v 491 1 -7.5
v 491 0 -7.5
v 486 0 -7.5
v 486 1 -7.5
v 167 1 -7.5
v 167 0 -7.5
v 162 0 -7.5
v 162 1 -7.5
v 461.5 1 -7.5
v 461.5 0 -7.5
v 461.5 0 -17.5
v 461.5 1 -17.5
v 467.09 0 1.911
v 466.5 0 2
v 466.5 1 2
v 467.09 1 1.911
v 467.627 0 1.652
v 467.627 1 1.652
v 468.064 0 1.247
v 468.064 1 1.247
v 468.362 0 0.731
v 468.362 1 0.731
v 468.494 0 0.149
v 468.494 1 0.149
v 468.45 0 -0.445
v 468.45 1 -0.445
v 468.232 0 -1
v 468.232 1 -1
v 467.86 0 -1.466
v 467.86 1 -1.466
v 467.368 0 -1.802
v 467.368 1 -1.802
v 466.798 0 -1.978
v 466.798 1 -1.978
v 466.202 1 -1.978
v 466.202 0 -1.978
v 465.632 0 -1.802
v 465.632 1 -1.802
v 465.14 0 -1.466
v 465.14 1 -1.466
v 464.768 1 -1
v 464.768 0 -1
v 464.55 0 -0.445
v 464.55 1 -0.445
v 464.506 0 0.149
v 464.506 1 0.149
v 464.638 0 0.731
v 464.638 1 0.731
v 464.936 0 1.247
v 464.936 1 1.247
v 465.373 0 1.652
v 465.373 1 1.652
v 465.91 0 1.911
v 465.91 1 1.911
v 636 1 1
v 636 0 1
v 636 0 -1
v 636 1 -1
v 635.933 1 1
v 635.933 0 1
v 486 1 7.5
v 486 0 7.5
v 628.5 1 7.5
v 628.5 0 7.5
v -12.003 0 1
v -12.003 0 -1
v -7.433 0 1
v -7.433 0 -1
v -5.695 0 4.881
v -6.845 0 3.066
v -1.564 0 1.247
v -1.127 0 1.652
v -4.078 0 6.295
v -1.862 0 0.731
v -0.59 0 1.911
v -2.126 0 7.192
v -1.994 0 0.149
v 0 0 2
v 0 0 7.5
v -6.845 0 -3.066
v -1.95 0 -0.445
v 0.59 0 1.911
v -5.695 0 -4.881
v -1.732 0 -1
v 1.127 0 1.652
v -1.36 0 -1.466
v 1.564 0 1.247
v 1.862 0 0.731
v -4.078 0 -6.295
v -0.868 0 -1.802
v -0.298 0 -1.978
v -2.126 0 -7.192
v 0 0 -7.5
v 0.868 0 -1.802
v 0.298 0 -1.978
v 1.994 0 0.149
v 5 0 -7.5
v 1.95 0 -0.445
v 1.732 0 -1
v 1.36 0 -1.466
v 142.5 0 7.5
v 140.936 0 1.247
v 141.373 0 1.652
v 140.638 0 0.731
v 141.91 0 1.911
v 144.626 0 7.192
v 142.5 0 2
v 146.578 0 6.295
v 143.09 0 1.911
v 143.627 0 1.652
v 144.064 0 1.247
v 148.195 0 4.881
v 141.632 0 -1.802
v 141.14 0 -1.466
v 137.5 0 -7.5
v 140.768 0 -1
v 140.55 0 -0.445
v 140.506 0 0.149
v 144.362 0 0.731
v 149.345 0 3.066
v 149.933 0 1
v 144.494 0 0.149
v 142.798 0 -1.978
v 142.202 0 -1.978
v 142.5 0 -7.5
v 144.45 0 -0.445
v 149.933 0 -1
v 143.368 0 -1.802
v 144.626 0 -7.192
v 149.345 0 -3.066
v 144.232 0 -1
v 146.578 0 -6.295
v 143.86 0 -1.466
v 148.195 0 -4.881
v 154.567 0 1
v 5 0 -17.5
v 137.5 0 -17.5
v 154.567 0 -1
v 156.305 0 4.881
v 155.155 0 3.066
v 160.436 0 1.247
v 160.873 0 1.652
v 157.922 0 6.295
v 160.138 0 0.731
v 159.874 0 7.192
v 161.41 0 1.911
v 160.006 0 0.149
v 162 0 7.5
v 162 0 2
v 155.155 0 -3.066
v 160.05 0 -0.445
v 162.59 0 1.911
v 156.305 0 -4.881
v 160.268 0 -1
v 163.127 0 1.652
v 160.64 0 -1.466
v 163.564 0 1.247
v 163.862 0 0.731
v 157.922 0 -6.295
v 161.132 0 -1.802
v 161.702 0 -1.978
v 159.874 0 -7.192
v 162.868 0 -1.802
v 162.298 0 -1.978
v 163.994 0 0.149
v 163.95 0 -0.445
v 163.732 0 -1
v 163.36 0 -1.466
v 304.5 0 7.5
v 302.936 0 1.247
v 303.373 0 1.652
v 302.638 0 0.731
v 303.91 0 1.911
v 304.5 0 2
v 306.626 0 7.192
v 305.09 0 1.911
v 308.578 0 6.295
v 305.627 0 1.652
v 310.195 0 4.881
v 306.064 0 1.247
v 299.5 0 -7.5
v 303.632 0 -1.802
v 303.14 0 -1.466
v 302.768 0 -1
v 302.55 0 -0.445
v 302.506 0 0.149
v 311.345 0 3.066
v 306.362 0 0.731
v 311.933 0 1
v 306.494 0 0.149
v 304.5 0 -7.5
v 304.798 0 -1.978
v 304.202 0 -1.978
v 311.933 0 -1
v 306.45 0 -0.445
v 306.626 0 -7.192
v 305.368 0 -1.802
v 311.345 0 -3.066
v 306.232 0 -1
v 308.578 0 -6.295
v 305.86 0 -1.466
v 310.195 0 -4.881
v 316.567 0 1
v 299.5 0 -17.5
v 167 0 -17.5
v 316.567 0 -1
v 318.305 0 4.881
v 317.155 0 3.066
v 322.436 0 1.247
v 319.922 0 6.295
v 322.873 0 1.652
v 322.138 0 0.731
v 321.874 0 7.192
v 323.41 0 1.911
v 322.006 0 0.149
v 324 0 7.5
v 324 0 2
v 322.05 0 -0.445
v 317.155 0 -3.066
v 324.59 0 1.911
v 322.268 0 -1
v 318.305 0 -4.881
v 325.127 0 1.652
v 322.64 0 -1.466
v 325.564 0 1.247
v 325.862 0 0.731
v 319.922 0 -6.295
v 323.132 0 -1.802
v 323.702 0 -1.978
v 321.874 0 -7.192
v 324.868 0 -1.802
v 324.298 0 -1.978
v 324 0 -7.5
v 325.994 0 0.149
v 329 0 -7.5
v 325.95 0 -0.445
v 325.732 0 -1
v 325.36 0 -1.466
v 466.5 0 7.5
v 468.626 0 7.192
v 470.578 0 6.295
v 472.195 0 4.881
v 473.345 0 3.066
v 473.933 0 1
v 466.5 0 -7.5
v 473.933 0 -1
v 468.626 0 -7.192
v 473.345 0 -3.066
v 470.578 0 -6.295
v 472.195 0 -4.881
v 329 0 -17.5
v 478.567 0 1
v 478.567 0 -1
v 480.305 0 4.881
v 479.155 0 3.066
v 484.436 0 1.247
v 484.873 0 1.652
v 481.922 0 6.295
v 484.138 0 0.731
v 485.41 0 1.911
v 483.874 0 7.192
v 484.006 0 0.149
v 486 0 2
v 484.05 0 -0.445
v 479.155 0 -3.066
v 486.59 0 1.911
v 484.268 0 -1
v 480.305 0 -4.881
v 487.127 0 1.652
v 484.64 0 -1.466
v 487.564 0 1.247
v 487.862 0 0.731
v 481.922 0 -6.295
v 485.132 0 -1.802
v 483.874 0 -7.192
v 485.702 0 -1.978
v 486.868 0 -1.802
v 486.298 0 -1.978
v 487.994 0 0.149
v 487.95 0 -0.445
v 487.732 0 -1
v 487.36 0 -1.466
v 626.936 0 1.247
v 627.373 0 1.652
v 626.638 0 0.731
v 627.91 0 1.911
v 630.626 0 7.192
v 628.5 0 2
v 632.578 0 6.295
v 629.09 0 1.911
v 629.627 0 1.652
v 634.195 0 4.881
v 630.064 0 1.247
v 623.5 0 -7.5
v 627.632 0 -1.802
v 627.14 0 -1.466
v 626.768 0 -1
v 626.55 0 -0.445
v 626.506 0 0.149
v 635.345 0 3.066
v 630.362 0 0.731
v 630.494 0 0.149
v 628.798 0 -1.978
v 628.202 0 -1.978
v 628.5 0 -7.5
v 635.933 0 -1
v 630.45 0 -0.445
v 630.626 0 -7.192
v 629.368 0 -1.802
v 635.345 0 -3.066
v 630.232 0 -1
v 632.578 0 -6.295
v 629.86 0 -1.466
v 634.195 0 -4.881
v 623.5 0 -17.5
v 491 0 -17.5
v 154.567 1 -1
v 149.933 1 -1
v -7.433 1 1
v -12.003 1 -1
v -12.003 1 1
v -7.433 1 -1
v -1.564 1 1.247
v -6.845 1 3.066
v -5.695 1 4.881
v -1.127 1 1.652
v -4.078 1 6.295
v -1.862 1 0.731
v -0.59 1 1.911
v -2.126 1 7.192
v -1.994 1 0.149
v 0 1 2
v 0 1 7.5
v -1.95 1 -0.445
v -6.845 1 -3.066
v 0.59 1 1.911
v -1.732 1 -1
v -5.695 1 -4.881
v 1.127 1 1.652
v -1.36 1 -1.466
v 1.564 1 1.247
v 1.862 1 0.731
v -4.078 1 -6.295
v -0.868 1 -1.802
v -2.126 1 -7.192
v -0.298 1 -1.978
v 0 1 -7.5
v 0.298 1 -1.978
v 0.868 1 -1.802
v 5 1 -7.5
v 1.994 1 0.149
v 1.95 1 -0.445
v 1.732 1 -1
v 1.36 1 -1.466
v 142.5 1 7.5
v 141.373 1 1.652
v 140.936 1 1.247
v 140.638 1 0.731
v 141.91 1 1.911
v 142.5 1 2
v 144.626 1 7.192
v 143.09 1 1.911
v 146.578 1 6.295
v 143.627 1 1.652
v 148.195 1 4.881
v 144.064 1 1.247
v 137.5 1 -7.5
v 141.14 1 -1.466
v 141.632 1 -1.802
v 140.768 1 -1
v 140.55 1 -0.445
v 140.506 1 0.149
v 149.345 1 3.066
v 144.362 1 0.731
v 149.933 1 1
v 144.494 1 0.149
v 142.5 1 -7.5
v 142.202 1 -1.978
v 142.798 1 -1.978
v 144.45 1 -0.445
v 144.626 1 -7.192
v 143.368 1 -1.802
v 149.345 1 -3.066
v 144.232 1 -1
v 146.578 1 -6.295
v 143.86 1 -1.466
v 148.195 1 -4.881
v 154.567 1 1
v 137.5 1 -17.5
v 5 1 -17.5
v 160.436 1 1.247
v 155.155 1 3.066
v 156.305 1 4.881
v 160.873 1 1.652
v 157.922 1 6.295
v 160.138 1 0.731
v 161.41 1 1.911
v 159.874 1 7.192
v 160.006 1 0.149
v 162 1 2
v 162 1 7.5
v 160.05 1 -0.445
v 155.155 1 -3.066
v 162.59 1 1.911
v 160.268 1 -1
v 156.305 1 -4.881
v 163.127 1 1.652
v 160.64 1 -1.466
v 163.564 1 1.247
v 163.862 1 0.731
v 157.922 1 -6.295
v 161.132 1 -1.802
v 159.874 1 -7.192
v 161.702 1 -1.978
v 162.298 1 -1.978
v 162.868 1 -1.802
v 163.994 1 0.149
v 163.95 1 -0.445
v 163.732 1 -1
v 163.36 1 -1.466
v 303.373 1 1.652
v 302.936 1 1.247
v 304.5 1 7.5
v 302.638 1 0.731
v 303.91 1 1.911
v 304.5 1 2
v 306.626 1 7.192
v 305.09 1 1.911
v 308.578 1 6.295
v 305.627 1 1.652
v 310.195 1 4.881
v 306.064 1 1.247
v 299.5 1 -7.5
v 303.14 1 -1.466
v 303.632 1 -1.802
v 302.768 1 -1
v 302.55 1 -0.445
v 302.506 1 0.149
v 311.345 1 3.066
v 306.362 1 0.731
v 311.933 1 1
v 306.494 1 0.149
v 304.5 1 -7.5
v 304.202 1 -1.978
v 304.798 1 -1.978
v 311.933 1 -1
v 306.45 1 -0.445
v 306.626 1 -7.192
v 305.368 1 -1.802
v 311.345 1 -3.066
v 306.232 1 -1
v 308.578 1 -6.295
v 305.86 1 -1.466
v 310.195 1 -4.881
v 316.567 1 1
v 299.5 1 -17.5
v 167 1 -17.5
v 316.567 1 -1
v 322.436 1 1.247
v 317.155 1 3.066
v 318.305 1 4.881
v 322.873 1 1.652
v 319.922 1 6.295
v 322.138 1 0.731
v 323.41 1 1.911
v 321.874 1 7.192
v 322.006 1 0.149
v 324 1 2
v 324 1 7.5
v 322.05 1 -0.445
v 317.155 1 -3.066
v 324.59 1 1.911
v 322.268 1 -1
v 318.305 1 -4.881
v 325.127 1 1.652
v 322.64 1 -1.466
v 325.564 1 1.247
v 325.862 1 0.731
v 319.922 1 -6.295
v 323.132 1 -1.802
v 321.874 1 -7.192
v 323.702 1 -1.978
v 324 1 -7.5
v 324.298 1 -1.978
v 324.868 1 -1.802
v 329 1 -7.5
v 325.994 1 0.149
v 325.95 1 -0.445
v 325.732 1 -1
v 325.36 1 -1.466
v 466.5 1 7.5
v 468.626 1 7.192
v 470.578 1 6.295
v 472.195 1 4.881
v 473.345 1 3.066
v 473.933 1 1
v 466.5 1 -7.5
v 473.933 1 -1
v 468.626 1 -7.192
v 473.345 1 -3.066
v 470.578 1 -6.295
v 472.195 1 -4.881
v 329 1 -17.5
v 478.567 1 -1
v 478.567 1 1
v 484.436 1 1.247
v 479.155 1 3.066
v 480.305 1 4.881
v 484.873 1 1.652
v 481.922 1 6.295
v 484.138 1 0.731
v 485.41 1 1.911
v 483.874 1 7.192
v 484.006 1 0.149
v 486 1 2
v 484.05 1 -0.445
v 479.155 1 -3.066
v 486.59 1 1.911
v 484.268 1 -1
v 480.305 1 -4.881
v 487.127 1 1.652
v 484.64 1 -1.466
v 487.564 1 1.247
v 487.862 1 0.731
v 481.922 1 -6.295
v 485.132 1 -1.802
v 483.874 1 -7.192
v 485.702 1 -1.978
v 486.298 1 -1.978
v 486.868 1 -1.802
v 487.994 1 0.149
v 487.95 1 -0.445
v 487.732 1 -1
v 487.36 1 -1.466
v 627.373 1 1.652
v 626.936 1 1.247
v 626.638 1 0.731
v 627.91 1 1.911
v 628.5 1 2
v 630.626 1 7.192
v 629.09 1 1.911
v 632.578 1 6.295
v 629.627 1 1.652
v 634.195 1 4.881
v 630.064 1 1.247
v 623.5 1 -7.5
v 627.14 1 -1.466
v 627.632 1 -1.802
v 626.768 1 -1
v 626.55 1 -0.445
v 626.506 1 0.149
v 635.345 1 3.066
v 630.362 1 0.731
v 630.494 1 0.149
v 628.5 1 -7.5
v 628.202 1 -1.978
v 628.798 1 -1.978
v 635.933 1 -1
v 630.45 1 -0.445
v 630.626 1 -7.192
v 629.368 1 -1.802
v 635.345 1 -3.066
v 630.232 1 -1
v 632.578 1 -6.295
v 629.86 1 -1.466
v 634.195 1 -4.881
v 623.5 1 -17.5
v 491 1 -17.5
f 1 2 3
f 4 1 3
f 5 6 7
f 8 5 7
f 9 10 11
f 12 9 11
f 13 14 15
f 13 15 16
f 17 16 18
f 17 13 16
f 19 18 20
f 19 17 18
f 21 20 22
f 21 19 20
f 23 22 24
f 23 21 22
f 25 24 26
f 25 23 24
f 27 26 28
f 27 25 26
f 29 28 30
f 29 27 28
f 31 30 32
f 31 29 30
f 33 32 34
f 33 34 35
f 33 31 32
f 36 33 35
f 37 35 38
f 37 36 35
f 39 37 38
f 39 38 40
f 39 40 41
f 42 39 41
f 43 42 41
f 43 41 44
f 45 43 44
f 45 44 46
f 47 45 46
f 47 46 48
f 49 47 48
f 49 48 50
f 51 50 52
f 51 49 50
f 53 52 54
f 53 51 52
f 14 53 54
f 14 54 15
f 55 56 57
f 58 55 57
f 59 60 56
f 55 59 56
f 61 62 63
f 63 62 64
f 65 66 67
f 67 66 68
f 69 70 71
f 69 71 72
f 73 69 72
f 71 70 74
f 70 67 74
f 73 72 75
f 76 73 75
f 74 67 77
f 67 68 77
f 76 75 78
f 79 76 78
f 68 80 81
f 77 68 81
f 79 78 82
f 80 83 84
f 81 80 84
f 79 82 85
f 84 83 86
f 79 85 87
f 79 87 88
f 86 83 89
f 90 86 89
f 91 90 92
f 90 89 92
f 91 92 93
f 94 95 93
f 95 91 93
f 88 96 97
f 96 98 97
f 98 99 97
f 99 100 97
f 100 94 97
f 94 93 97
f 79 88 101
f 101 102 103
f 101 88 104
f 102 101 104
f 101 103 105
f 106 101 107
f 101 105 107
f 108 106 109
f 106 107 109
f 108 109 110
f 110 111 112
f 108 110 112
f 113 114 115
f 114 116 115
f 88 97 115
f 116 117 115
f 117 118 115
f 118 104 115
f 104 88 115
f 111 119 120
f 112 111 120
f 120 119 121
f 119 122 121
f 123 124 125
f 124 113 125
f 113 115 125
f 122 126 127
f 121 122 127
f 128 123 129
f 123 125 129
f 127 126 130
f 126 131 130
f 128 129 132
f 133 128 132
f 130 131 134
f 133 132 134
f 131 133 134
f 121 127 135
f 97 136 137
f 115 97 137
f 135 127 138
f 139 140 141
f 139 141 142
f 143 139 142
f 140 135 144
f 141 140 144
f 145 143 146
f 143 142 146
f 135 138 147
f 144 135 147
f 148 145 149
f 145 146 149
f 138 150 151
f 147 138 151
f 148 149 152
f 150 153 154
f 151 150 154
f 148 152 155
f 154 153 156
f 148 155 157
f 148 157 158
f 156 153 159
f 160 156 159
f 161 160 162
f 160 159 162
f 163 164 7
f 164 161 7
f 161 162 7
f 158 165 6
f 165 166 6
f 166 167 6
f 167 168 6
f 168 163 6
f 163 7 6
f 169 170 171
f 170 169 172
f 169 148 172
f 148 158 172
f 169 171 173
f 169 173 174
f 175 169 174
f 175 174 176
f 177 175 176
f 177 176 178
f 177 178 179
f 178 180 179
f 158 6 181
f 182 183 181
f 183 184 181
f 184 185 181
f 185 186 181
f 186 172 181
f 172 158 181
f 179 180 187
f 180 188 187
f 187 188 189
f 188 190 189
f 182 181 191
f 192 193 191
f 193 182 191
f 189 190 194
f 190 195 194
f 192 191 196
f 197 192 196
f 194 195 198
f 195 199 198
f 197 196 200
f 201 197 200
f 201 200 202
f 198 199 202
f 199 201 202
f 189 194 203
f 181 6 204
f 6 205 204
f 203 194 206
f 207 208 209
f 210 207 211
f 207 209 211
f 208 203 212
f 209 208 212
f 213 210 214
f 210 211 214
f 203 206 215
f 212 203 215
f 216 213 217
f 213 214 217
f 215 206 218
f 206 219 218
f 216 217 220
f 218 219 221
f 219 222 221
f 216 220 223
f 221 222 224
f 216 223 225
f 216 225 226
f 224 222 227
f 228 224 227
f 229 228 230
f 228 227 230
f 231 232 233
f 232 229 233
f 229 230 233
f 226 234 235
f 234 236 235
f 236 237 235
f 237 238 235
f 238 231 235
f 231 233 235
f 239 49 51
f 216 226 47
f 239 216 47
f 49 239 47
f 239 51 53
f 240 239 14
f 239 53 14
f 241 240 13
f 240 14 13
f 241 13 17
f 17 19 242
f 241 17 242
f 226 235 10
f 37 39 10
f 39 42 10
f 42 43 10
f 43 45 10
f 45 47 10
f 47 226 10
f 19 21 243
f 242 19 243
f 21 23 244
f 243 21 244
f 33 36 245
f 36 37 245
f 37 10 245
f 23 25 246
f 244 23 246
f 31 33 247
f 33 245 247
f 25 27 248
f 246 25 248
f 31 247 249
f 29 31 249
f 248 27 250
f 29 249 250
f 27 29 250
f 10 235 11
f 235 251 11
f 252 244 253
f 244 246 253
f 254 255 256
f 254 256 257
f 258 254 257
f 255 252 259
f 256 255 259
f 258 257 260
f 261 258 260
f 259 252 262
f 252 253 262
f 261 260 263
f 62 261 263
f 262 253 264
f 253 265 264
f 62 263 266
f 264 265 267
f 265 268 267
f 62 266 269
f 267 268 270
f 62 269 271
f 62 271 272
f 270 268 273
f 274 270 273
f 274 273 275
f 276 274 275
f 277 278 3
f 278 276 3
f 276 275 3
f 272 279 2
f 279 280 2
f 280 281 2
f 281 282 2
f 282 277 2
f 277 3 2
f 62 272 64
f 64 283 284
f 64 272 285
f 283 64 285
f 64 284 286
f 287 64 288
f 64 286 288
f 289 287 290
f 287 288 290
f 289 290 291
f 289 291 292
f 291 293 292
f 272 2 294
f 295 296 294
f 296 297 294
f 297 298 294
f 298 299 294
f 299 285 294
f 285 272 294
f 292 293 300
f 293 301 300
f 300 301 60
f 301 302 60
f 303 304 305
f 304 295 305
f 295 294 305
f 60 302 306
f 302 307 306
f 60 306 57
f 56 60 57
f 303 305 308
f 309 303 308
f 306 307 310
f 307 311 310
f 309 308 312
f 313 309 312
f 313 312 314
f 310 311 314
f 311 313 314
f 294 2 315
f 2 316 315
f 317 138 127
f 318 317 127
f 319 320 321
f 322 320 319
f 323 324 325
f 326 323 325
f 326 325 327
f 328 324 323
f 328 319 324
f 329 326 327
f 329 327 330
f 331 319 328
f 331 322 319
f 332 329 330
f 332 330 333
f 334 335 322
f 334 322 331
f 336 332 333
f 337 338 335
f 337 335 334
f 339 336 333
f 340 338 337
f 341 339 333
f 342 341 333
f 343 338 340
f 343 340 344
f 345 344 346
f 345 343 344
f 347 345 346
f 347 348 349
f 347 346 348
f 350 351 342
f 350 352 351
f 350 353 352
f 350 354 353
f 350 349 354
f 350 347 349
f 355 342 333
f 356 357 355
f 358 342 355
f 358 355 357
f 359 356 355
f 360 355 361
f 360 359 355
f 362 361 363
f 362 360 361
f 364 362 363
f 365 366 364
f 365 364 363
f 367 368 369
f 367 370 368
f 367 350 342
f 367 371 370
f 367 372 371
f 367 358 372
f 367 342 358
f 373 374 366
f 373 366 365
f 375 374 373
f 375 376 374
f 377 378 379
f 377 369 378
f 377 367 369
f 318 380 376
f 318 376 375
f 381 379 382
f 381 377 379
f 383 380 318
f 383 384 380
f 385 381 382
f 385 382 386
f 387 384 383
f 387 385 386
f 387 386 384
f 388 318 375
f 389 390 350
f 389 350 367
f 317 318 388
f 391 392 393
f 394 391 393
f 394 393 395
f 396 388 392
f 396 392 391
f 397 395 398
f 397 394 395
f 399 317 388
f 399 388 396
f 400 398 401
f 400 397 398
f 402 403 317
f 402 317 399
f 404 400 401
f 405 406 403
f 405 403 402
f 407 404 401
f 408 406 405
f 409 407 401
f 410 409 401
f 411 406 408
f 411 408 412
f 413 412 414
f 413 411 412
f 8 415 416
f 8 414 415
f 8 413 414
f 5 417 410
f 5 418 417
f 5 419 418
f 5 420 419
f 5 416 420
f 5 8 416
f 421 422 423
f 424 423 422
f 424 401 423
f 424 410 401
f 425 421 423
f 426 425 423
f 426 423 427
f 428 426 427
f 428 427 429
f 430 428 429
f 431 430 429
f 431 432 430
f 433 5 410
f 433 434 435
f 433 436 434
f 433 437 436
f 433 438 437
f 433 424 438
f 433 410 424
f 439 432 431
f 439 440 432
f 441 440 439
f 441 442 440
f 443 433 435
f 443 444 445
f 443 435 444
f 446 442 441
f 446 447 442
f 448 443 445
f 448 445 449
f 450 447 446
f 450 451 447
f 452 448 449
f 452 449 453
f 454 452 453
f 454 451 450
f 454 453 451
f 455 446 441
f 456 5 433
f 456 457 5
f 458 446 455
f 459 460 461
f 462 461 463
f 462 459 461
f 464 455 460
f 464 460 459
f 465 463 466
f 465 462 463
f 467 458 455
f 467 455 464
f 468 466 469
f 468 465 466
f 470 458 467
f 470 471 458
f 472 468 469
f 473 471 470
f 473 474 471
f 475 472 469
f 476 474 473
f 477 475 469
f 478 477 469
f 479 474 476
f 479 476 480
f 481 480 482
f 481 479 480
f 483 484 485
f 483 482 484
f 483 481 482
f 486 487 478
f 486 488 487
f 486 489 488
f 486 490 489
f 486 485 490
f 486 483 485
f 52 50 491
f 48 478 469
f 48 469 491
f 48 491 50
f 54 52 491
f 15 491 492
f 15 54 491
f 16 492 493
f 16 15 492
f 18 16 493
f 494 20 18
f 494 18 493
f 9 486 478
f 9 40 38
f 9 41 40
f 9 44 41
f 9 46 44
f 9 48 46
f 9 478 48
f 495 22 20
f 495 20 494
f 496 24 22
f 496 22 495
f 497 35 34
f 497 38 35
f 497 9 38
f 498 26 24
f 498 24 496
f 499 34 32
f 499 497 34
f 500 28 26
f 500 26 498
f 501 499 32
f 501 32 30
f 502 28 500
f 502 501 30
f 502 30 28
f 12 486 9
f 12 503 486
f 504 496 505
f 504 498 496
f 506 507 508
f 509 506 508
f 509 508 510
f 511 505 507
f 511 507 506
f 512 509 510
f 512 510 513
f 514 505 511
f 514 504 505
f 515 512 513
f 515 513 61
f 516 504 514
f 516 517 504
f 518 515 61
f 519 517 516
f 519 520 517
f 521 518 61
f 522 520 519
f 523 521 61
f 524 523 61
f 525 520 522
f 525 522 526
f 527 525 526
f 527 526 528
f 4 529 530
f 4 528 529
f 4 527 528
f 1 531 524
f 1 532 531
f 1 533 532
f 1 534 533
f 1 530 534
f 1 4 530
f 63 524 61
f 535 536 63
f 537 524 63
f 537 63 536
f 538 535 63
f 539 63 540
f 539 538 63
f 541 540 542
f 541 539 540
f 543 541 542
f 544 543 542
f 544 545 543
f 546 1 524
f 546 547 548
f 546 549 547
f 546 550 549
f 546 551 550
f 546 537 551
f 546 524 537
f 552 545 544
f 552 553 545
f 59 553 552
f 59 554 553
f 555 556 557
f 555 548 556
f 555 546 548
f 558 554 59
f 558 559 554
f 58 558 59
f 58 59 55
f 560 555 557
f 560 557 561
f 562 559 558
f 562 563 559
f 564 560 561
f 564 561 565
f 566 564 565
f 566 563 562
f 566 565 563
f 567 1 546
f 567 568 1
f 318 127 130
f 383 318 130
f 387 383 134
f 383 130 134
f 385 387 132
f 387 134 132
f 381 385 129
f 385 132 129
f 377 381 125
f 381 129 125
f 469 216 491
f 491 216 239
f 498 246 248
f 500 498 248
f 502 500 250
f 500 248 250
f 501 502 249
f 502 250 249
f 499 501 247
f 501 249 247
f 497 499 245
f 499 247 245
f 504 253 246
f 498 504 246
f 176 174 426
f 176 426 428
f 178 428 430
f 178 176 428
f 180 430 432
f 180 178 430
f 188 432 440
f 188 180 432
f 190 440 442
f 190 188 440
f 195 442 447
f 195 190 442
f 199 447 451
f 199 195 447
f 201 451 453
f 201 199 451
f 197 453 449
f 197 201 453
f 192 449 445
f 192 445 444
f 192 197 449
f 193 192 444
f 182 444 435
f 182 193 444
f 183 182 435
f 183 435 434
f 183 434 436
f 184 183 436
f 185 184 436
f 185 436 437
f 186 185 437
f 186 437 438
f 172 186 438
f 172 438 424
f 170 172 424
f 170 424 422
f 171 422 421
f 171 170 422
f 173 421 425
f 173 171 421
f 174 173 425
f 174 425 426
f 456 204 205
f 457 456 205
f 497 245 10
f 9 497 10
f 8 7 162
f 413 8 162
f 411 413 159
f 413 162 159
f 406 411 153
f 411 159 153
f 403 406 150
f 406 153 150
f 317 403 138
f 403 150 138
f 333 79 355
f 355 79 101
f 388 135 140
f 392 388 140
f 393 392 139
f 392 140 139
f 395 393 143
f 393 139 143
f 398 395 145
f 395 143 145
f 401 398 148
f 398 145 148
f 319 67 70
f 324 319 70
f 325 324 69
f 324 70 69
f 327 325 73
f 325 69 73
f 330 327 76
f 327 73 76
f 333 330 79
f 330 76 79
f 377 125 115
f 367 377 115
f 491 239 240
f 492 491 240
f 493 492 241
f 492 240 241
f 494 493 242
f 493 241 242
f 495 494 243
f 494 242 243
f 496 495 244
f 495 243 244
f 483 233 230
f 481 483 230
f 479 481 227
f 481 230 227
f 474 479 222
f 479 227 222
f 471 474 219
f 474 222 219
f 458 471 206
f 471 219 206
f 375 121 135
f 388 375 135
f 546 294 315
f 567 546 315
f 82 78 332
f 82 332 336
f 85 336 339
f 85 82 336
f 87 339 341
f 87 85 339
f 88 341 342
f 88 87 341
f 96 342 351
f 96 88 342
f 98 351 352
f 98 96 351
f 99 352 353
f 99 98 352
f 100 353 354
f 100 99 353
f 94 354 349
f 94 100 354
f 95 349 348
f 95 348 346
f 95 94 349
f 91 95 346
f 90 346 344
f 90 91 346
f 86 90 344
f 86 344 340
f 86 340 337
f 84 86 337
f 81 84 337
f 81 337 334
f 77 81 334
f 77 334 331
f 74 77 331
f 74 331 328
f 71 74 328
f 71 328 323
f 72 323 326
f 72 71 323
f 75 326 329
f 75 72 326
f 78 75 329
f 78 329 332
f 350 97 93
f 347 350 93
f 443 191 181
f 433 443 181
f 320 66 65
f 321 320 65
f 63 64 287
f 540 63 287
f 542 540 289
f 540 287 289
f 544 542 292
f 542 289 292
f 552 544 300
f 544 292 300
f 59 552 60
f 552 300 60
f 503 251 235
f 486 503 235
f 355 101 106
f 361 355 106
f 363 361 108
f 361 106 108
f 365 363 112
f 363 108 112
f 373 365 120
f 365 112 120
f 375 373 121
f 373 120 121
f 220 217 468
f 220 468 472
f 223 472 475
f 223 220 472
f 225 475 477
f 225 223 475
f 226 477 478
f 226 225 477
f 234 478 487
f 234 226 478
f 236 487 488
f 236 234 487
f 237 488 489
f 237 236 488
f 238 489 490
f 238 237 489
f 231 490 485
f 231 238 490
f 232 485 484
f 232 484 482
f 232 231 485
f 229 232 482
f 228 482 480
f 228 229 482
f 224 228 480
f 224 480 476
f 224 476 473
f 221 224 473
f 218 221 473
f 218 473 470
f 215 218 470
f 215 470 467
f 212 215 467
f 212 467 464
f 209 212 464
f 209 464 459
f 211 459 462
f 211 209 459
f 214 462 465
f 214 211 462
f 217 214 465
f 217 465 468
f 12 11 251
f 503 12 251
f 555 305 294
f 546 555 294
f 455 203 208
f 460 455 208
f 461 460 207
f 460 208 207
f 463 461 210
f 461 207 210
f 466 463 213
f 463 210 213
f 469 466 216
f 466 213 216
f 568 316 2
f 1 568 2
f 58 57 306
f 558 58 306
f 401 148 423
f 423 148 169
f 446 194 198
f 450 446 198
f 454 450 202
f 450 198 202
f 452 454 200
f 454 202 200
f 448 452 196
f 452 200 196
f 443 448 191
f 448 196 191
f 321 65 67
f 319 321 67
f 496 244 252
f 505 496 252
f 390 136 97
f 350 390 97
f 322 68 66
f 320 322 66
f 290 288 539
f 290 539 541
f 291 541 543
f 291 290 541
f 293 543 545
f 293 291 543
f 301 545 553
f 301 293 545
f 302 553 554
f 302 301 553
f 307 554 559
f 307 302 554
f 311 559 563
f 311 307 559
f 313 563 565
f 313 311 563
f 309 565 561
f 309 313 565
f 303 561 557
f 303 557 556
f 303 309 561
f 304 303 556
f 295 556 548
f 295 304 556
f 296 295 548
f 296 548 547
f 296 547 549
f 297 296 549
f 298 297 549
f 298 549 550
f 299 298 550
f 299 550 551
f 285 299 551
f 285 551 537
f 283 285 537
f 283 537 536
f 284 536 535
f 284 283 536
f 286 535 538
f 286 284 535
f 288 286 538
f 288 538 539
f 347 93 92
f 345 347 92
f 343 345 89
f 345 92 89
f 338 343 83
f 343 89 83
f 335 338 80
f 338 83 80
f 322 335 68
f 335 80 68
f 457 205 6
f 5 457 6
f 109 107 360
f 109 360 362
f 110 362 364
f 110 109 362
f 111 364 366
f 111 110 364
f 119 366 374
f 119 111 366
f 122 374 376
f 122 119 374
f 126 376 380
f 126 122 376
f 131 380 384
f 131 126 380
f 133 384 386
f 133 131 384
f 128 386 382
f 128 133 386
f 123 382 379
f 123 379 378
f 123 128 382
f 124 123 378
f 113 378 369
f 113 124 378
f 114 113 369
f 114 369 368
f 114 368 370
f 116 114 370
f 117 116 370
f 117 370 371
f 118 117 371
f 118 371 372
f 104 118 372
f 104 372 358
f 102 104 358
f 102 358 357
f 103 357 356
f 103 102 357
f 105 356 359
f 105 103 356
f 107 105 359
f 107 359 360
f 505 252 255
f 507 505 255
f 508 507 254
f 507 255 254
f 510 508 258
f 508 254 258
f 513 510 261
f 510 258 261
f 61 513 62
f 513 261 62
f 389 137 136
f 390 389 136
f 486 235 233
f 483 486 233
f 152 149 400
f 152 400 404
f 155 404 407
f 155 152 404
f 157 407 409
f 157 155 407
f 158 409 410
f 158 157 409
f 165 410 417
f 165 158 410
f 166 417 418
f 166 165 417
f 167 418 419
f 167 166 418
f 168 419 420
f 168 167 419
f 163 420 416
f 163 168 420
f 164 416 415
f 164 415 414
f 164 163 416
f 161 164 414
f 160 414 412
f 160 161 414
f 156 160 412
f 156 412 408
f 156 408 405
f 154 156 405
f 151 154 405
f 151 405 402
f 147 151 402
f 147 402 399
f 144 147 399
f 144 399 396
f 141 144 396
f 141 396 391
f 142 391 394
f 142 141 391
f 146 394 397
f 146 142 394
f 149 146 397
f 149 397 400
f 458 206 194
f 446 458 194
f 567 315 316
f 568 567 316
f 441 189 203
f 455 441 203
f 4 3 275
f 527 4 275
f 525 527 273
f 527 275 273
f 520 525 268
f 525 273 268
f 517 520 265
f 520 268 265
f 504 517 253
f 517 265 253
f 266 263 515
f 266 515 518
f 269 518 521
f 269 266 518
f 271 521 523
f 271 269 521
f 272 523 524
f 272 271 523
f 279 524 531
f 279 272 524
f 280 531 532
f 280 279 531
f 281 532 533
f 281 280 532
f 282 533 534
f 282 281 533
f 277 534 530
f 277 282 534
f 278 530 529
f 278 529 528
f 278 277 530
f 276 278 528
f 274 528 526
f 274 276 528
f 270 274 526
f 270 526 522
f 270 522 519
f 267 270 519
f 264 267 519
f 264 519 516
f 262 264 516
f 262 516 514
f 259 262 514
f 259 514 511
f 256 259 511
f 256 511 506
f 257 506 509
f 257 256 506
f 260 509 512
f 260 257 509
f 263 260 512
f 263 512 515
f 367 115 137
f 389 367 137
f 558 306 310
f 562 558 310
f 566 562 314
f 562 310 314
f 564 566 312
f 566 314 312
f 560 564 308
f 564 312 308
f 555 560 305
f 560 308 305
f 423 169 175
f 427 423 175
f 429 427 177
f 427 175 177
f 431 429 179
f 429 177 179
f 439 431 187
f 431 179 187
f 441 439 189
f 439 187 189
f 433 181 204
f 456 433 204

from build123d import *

# Parameters (mm, degrees)
SKETCH1_R           = 2
BOSS_EXTRUDE1_DEPTH = 1


with BuildPart() as part:
    # Sketch1 → Boss-Extrude1 (new body)
    with BuildSketch(Plane(origin=(0, 0, 0), x_dir=(1, 0, 0), z_dir=(0, 1, 0))):
        with BuildLine():
            Line((5, 7.5), (0, 7.5))
            ThreePointArc((0, 7.5), (-4.937104415, 5.645794895), (-7.433034374, 1))
            Line((-7.433034374, 1), (-12.003034374, 1))
            Line((-12.003034374, 1), (-12.003034374, -1))
            Line((-12.003034374, -1), (-7.433034374, -1))
            ThreePointArc((-7.433034374, -1), (-4.937104415, -5.645794895), (0, -7.5))
            Line((0, -7.5), (142.5, -7.5))
            ThreePointArc((142.5, -7.5), (147.437104415, -5.645794895), (149.933034374, -1))
            Line((149.933034374, -1), (154.566965626, -1))
            ThreePointArc((154.566965626, -1), (157.062895585, -5.645794895), (162, -7.5))
            Line((162, -7.5), (304.5, -7.5))
            ThreePointArc((304.5, -7.5), (309.437104415, -5.645794895), (311.933034374, -1))
            Line((311.933034374, -1), (316.566965626, -1))
            ThreePointArc((316.566965626, -1), (319.062895585, -5.645794895), (324, -7.5))
            Line((324, -7.5), (466.5, -7.5))
            ThreePointArc((466.5, -7.5), (471.437104415, -5.645794895), (473.933034374, -1))
            Line((473.933034374, -1), (478.566965626, -1))
            ThreePointArc((478.566965626, -1), (481.062895585, -5.645794895), (486, -7.5))
            Line((486, -7.5), (628.5, -7.5))
            ThreePointArc((628.5, -7.5), (633.437104415, -5.645794895), (635.933034374, -1))
            Line((635.933034374, -1), (636, -1))
            Line((636, -1), (636, 1))
            Line((636, 1), (635.933034374, 1))
            ThreePointArc((635.933034374, 1), (633.437104415, 5.645794895), (628.5, 7.5))
            Line((628.5, 7.5), (623.5, 7.5))
            Line((623.5, 7.5), (623.5, 17.5))
            Line((623.5, 17.5), (491, 17.5))
            Line((491, 17.5), (491, 7.5))
            Line((491, 7.5), (486, 7.5))
            ThreePointArc((486, 7.5), (481.062895585, 5.645794895), (478.566965626, 1))
            Line((478.566965626, 1), (473.933034374, 1))
            ThreePointArc((473.933034374, 1), (471.437104415, 5.645794895), (466.5, 7.5))
            Line((466.5, 7.5), (461.5, 7.5))
            Line((461.5, 7.5), (461.5, 17.5))
            Line((461.5, 17.5), (329, 17.5))
            Line((329, 17.5), (329, 7.5))
            Line((329, 7.5), (324, 7.5))
            ThreePointArc((324, 7.5), (319.062895585, 5.645794895), (316.566965626, 1))
            Line((316.566965626, 1), (311.933034374, 1))
            ThreePointArc((311.933034374, 1), (309.437104415, 5.645794895), (304.5, 7.5))
            Line((304.5, 7.5), (299.5, 7.5))
            Line((299.5, 7.5), (299.5, 17.5))
            Line((299.5, 17.5), (167, 17.5))
            Line((167, 17.5), (167, 7.5))
            Line((167, 7.5), (162, 7.5))
            ThreePointArc((162, 7.5), (157.062895585, 5.645794895), (154.566965626, 1))
            Line((154.566965626, 1), (149.933034374, 1))
            ThreePointArc((149.933034374, 1), (147.437104415, 5.645794895), (142.5, 7.5))
            Line((142.5, 7.5), (137.5, 7.5))
            Line((137.5, 7.5), (137.5, 17.5))
            Line((137.5, 17.5), (5, 17.5))
            Line((5, 17.5), (5, 7.5))
        make_face()
        with Locations(Location((0, 0, 0), (0, 0, 270))):
            Circle(SKETCH1_R, mode=Mode.SUBTRACT)
        with Locations(Location((142.5, 0, 0), (0, 0, 270))):
            Circle(SKETCH1_R, mode=Mode.SUBTRACT)
        with Locations(Location((304.5, 0, 0), (0, 0, 270))):
            Circle(SKETCH1_R, mode=Mode.SUBTRACT)
        with Locations(Location((162, 0, 0), (0, 0, 270))):
            Circle(SKETCH1_R, mode=Mode.SUBTRACT)
        with Locations(Location((466.5, 0, 0), (0, 0, 270))):
            Circle(SKETCH1_R, mode=Mode.SUBTRACT)
        with Locations(Location((324, 0, 0), (0, 0, 270))):
            Circle(SKETCH1_R, mode=Mode.SUBTRACT)
        with Locations(Location((628.5, 0, 0), (0, 0, 270))):
            Circle(SKETCH1_R, mode=Mode.SUBTRACT)
        with Locations(Location((486, 0, 0), (0, 0, 270))):
            Circle(SKETCH1_R, mode=Mode.SUBTRACT)
    extrude(amount=BOSS_EXTRUDE1_DEPTH)


solid = part.part
